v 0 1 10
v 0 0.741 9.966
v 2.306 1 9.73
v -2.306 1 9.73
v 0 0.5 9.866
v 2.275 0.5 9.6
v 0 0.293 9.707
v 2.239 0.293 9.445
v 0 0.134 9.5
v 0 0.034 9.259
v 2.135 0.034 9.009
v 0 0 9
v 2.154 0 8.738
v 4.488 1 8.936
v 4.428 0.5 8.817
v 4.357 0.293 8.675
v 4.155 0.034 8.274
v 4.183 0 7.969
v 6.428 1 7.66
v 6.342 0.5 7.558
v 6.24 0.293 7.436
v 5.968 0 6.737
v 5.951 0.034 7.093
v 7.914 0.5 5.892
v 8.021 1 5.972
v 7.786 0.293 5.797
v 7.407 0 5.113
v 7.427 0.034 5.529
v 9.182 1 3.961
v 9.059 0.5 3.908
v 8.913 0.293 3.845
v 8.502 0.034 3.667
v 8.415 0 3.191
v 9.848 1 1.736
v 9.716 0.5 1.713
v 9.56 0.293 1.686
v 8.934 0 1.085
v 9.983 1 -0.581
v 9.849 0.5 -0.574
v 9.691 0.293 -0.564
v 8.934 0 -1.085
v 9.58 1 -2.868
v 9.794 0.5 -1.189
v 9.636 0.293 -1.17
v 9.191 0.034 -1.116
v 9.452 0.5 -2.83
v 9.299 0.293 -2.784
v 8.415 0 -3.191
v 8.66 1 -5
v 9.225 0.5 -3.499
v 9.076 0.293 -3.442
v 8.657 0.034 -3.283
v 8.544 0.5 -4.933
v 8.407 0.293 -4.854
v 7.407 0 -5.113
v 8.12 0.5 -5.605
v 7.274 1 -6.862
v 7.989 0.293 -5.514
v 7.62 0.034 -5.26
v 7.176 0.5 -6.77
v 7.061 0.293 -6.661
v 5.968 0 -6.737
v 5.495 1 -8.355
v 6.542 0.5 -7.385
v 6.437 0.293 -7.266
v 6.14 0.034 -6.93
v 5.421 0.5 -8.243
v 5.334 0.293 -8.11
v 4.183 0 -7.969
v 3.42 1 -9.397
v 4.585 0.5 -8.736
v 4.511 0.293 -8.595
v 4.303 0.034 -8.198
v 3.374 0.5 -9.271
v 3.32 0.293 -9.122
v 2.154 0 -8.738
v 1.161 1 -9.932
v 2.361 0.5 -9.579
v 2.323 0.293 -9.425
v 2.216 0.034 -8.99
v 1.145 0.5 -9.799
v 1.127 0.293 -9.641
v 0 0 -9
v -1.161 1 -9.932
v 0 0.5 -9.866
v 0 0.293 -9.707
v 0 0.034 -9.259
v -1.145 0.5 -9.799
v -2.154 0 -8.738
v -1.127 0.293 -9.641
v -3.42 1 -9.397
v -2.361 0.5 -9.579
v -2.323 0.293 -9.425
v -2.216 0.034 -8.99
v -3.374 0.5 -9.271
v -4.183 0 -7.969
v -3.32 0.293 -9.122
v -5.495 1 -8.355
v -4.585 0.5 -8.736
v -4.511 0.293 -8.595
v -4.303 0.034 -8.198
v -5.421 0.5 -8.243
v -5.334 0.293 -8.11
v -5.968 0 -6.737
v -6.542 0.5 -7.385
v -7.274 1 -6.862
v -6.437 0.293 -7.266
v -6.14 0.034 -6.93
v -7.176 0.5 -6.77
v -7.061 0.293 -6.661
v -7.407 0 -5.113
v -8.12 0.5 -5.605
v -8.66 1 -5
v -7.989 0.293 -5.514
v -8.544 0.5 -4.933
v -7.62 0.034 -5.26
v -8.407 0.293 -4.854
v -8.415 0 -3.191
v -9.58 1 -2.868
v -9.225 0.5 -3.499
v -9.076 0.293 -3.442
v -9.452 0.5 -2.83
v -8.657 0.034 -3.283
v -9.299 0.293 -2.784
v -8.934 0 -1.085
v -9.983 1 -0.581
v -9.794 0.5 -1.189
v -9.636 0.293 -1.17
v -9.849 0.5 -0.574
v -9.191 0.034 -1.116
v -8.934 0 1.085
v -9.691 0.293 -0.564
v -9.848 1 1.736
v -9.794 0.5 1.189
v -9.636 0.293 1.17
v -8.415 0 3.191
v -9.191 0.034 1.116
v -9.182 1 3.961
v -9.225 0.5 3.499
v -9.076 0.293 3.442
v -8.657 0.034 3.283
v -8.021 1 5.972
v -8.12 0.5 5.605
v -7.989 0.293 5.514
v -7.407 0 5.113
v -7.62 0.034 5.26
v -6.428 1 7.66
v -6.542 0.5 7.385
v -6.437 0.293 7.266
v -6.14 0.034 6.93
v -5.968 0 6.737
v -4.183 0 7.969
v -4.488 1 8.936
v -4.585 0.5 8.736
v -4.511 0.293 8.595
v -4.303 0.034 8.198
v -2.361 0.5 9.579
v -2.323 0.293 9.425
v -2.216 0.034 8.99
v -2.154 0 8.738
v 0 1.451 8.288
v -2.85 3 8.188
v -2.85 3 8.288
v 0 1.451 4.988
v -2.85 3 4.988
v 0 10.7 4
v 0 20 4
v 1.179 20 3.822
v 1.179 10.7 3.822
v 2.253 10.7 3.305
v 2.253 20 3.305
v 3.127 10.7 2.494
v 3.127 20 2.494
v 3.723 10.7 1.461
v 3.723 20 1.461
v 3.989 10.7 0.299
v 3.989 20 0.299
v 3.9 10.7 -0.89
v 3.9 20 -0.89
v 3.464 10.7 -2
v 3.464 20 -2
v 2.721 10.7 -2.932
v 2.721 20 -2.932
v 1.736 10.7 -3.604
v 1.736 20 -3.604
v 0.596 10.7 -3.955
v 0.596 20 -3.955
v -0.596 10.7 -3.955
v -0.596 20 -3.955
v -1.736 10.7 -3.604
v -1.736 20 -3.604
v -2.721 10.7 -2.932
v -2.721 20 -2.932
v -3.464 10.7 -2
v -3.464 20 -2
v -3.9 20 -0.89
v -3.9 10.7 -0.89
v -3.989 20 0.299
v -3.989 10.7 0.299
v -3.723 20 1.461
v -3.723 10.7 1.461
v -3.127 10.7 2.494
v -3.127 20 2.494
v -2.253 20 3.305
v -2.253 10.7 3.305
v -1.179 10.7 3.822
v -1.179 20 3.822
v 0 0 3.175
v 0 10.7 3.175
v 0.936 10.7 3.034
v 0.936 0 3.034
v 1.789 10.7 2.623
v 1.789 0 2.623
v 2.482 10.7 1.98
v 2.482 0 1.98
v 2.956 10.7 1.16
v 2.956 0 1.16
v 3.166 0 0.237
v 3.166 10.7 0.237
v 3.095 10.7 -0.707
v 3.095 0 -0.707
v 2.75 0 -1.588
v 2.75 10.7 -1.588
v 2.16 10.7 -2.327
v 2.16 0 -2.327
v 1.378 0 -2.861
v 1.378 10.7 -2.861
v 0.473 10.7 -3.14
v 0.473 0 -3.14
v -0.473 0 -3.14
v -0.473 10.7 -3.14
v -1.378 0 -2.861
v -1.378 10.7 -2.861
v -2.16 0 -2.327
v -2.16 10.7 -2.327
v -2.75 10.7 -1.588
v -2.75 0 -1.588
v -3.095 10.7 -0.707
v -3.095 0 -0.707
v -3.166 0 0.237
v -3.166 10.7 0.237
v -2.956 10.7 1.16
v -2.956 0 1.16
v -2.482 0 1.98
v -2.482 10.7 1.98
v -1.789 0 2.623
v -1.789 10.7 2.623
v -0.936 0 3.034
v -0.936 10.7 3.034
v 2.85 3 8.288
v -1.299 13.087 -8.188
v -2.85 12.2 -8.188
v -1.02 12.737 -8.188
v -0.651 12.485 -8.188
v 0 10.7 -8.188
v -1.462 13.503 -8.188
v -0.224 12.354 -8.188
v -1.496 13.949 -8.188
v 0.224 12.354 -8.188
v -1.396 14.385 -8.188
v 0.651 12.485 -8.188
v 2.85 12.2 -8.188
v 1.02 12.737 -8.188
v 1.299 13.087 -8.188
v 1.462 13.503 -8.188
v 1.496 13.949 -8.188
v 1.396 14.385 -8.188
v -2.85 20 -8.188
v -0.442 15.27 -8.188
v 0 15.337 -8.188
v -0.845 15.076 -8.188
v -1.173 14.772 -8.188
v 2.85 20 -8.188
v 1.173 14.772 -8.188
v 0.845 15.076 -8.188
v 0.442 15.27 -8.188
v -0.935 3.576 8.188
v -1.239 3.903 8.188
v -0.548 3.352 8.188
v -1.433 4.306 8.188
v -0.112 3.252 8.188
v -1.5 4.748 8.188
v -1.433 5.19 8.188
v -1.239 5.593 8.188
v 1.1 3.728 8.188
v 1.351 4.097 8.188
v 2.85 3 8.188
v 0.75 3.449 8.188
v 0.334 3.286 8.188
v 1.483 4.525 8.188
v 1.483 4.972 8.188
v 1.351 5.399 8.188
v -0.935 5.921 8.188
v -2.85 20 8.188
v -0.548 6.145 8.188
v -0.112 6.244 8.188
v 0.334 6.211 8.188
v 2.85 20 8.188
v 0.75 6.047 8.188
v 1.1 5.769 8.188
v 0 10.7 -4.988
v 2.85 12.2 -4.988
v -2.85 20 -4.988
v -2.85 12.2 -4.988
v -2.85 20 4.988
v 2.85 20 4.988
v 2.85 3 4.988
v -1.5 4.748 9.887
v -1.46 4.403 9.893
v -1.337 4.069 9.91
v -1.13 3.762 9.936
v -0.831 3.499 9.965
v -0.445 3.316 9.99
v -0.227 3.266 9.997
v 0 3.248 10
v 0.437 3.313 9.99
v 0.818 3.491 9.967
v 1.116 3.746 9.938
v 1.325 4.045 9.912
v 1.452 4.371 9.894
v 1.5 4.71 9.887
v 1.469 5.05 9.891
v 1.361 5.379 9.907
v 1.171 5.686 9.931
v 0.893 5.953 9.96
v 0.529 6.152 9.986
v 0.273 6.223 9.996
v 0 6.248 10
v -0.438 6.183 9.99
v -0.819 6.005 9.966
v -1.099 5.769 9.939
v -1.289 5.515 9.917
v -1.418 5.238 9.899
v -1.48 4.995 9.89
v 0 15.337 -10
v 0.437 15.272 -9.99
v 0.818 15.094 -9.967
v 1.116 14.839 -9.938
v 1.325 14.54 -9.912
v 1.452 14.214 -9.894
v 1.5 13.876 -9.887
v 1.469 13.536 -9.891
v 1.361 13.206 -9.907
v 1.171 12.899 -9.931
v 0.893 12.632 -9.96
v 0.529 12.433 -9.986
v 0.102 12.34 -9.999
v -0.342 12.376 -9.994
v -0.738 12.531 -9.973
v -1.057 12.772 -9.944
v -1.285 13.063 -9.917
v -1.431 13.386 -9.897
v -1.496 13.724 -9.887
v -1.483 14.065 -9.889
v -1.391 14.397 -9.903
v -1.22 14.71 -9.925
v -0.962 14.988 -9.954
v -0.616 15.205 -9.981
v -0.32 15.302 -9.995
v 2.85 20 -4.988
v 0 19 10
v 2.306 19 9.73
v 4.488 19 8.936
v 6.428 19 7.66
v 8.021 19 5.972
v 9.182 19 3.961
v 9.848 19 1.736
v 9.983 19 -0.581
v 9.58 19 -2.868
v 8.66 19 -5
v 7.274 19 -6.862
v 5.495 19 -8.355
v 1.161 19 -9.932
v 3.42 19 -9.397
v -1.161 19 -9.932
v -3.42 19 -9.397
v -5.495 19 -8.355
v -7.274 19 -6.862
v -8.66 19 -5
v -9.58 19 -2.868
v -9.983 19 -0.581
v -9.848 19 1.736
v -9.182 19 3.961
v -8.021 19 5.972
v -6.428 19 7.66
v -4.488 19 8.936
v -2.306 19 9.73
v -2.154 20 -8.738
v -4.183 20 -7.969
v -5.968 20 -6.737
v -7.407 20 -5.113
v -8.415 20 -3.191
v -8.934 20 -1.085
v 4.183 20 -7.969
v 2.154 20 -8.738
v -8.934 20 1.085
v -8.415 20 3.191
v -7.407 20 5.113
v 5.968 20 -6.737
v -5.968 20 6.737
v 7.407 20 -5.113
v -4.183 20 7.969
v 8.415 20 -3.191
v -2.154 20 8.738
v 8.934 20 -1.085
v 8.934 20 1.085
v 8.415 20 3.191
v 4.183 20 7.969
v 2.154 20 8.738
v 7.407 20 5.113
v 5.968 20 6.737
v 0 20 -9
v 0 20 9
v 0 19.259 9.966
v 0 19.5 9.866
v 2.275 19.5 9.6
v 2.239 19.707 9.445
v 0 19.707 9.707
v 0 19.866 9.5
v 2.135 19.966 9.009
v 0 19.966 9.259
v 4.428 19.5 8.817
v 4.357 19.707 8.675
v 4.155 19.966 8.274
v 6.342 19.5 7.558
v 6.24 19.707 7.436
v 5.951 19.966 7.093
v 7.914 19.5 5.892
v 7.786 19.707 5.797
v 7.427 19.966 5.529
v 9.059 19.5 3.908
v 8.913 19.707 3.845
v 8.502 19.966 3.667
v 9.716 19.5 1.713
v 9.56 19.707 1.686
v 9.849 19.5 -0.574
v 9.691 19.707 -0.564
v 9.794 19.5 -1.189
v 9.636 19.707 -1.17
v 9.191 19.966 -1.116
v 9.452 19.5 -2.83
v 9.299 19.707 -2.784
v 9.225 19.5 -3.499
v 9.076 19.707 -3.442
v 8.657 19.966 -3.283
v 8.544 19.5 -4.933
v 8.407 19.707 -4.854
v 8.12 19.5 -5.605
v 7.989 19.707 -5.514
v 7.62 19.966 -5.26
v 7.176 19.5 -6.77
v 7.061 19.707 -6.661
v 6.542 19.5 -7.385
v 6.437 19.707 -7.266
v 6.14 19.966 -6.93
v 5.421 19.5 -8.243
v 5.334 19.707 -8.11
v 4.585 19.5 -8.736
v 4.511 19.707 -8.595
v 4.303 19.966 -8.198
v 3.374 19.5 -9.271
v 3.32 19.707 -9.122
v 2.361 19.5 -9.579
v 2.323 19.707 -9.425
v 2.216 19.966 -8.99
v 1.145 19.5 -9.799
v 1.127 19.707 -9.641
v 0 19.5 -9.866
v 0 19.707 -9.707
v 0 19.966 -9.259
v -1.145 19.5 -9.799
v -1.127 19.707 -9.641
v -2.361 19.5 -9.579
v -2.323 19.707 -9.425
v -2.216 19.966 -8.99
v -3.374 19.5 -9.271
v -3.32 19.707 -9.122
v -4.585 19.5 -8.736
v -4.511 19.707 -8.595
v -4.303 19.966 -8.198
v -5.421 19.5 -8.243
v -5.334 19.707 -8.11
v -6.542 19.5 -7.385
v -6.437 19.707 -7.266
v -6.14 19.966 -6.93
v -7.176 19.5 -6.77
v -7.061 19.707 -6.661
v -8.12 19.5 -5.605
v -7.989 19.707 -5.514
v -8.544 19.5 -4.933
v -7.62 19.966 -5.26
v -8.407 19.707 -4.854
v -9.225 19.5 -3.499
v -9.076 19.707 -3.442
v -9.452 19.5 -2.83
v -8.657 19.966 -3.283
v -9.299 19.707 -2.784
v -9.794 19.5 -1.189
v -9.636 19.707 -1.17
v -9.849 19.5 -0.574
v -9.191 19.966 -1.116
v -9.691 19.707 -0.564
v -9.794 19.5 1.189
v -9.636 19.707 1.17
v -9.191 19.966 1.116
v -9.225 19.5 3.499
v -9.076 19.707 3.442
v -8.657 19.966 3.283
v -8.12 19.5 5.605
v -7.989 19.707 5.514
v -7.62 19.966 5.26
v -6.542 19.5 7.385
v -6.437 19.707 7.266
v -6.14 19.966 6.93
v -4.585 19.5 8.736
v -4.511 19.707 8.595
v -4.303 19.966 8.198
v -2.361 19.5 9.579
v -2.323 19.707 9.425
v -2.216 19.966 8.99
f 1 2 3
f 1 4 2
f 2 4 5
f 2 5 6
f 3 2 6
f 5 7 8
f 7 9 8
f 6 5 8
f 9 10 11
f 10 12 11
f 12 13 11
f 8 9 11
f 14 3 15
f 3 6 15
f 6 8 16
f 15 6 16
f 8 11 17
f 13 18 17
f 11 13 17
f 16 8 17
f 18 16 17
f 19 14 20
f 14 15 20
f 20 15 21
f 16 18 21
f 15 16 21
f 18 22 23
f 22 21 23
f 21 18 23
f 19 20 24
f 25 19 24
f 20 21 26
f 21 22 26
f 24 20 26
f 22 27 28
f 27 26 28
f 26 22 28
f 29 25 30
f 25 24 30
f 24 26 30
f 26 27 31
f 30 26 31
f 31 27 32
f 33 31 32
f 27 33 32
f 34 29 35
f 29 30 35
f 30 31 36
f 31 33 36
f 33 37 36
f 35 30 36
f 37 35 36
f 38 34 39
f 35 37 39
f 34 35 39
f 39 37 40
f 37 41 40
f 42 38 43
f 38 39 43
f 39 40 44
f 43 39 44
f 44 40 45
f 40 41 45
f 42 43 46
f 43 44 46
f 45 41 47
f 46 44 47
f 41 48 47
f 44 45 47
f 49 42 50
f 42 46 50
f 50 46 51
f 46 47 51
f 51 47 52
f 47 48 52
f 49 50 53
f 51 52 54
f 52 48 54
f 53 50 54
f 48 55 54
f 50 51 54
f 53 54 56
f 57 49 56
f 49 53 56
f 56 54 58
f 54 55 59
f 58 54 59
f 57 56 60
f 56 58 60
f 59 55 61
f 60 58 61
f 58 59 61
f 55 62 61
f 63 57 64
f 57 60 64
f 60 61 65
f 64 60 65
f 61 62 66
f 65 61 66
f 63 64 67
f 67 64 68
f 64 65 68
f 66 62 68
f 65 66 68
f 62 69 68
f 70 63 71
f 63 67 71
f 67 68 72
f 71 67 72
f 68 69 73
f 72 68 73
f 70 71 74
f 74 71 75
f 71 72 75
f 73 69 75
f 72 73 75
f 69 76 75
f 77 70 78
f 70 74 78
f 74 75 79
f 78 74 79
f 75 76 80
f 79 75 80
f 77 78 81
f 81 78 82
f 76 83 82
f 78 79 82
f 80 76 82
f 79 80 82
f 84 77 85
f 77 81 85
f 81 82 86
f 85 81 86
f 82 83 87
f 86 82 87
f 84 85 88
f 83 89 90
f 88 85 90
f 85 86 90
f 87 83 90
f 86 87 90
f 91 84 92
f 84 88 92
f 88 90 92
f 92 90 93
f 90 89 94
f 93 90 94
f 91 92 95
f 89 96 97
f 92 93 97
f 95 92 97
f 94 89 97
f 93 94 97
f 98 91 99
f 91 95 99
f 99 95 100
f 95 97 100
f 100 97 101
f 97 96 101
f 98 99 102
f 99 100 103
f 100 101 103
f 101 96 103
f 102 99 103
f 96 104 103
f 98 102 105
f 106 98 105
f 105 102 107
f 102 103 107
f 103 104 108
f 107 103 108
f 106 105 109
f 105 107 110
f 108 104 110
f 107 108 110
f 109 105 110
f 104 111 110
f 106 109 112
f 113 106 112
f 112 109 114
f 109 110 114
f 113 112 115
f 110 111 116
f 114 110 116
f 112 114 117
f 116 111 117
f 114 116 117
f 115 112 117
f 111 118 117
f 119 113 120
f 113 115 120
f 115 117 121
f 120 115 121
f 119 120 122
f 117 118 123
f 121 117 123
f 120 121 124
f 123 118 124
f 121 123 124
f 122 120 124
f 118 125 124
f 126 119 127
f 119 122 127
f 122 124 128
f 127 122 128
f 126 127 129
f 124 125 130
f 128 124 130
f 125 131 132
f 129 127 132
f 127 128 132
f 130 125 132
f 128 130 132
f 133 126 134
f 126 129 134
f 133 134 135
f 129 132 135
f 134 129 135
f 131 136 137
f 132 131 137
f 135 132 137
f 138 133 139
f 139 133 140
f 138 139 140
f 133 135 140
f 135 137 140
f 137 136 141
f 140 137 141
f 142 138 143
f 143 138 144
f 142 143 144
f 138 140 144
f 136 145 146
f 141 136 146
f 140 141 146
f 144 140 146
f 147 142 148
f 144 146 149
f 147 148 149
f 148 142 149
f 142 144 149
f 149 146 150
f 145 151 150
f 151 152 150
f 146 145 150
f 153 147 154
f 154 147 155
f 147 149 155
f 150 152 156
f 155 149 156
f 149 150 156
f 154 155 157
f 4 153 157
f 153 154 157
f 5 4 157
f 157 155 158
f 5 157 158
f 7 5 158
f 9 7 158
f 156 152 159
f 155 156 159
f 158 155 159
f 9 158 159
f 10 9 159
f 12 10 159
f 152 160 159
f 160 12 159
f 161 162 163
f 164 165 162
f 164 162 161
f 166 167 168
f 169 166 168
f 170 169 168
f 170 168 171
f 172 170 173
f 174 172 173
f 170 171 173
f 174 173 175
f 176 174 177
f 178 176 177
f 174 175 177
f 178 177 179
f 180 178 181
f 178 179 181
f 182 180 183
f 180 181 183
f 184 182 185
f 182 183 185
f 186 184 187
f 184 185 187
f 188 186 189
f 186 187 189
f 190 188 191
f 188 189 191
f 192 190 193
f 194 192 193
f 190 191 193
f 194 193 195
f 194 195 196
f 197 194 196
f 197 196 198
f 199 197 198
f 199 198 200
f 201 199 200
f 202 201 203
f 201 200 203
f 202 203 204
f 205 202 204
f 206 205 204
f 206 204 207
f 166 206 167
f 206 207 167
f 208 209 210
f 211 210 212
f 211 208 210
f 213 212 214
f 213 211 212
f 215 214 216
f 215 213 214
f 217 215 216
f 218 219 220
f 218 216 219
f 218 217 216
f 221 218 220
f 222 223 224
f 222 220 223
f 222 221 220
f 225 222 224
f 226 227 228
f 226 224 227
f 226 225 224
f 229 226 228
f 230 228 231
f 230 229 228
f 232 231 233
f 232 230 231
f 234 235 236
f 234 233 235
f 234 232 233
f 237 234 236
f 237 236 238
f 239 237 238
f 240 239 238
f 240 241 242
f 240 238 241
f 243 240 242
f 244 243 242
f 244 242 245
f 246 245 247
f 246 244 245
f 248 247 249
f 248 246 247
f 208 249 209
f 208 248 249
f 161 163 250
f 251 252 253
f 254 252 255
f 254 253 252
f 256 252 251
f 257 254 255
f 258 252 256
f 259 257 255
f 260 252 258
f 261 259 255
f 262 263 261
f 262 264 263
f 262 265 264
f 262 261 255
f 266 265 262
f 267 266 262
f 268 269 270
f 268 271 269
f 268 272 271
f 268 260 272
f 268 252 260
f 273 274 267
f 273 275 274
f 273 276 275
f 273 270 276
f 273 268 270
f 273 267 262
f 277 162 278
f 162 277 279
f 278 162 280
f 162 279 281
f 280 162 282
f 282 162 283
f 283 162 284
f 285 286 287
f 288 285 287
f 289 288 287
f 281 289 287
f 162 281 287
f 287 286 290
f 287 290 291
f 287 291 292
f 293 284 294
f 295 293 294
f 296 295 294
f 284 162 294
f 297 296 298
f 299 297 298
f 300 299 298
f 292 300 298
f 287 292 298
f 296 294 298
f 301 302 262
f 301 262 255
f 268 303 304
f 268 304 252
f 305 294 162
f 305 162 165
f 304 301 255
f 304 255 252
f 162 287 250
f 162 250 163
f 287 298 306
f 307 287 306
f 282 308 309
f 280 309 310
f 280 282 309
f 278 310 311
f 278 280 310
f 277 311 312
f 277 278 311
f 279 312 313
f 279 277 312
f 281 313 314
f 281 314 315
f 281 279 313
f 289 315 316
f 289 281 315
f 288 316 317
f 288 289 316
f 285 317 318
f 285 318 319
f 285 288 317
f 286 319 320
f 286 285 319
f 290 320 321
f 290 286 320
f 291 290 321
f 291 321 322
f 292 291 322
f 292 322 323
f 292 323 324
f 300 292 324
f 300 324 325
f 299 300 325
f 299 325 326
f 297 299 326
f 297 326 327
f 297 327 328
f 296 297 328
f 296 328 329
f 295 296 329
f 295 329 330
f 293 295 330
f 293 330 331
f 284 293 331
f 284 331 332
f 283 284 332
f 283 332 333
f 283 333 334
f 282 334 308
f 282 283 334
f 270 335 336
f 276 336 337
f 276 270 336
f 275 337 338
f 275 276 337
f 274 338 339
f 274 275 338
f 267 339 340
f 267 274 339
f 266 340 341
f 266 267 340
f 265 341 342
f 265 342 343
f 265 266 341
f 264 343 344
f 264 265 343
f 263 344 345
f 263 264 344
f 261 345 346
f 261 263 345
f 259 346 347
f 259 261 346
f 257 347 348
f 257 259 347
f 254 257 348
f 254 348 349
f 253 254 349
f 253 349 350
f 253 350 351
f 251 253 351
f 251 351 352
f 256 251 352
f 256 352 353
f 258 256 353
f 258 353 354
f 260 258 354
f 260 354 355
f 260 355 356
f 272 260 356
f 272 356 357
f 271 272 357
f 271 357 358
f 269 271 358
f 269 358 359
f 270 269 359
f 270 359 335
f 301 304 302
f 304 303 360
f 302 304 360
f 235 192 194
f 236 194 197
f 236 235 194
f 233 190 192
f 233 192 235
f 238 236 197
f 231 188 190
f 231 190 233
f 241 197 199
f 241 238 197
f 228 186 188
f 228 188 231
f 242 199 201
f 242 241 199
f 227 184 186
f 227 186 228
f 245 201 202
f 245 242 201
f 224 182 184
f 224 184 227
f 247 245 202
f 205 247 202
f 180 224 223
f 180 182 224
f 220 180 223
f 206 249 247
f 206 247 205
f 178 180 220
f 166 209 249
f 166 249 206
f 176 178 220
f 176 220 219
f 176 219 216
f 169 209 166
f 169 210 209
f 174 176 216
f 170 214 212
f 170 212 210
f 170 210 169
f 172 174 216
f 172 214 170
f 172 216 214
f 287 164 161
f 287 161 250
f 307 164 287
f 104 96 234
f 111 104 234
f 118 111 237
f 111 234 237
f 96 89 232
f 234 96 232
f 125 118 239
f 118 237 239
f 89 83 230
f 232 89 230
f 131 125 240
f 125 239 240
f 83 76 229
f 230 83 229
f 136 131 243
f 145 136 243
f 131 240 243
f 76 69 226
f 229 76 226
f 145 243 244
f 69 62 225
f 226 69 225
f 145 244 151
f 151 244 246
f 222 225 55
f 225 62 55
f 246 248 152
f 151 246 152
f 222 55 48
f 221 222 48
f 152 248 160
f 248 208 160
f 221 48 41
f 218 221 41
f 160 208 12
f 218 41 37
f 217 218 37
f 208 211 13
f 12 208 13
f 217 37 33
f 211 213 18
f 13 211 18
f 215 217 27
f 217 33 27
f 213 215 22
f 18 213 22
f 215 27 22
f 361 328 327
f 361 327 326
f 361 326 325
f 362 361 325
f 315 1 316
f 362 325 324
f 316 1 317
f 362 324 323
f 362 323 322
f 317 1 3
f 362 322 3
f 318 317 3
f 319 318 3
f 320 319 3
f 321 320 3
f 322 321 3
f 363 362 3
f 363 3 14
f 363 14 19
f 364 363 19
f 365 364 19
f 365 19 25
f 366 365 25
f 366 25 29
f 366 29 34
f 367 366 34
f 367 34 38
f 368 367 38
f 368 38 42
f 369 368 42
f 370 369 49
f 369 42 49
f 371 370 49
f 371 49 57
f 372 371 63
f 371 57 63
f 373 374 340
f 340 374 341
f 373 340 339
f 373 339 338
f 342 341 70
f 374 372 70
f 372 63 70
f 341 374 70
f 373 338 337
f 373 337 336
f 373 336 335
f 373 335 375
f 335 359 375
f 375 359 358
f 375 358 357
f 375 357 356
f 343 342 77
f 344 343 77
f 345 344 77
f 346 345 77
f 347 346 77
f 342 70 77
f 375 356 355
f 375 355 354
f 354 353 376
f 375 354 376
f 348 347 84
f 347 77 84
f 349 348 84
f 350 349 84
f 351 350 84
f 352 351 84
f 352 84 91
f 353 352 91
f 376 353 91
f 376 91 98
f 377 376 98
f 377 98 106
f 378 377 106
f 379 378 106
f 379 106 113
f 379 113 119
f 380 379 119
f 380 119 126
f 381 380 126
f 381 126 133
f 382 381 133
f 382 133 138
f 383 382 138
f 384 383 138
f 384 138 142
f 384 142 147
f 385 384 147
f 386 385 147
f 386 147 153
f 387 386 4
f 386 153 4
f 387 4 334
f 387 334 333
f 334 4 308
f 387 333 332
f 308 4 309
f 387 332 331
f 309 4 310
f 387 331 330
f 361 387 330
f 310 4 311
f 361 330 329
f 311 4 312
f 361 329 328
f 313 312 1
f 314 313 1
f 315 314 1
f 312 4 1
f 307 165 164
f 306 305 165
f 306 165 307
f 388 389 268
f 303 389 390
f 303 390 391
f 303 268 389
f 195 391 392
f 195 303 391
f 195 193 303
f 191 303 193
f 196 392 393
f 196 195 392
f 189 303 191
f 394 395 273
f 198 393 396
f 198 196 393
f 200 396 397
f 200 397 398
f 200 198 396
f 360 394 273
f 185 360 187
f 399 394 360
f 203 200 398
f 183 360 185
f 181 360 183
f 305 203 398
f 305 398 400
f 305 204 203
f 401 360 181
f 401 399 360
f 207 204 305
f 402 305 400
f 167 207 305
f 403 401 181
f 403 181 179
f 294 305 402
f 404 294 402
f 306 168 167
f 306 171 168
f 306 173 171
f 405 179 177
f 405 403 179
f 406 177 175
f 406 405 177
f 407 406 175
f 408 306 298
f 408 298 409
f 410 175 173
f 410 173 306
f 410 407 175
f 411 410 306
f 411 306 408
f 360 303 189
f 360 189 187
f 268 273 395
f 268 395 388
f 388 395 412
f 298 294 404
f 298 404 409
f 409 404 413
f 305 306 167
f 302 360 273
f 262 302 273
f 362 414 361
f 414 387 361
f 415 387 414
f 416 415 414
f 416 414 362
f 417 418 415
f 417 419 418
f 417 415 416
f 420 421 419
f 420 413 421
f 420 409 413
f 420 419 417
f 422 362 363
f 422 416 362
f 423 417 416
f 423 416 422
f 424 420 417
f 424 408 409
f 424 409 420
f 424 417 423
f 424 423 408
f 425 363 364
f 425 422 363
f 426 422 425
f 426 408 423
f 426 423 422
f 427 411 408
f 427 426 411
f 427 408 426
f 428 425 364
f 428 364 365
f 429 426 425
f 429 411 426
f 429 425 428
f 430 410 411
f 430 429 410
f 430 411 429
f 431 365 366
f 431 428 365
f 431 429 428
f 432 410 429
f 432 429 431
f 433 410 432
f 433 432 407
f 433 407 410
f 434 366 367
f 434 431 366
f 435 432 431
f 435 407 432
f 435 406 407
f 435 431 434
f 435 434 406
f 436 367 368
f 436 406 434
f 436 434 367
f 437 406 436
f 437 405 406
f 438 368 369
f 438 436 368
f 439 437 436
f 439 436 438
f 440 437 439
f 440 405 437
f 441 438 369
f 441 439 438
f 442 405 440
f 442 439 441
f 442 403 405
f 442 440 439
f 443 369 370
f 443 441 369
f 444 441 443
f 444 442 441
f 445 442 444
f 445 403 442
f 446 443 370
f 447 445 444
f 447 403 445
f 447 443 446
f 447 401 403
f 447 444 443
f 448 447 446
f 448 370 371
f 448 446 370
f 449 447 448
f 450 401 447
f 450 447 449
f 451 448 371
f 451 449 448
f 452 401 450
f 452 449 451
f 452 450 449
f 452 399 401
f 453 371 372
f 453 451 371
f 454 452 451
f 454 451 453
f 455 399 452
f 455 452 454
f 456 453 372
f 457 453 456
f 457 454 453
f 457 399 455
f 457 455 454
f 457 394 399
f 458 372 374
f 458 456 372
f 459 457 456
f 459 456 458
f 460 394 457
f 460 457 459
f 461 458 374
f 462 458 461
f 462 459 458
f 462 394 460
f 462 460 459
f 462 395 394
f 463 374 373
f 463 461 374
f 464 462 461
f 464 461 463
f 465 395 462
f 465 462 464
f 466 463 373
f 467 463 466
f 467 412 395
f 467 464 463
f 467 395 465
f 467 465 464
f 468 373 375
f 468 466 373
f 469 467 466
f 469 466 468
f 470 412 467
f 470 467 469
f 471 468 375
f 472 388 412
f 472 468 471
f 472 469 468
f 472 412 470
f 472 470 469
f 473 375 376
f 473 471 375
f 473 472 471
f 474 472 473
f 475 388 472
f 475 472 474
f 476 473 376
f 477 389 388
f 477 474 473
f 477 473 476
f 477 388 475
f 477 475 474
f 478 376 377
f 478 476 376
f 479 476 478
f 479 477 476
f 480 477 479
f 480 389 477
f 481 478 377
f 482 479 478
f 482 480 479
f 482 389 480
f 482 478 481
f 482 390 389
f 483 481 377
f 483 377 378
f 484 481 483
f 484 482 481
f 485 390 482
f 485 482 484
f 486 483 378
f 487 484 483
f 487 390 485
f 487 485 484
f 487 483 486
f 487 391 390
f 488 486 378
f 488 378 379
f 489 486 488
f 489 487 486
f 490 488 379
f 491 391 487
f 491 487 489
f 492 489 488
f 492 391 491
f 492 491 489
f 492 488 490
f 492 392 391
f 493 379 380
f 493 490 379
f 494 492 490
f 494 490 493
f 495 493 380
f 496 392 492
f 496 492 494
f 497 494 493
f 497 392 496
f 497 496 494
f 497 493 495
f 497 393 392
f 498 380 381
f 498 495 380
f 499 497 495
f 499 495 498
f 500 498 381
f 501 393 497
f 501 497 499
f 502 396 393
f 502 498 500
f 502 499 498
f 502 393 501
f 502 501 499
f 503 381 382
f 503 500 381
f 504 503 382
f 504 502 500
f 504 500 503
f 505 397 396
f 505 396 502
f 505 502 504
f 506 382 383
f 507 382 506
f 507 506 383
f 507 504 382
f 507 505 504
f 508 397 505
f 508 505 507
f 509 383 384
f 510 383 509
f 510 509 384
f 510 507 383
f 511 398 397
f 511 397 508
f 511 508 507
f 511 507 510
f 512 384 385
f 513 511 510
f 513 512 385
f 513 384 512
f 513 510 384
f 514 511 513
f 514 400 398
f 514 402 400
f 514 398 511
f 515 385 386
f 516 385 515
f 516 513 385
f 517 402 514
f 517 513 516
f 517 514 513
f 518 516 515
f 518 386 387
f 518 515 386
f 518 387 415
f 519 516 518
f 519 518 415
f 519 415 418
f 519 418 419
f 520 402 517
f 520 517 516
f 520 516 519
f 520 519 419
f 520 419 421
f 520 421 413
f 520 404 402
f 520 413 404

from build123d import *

# Parameters (mm, degrees)
SKETCH1_R           = 10
SKETCH1_R_2         = 3.175
BOSS_EXTRUDE1_DEPTH = 20
SKETCH2_W           = 5.7
SKETCH2_H           = 3.2
CUT_EXTRUDE1_DEPTH  = 17
CUT_EXTRUDE2_DEPTH  = 3.3
SKETCH4_R           = 4
CUT_EXTRUDE3_DEPTH  = 9.3
SKETCH5_W           = 5.7
SKETCH5_H           = 3.2
CUT_EXTRUDE5_DEPTH  = 7.8
CUT_EXTRUDE6_DEPTH  = 3.2
FILLET1_R           = 1
SKETCH7_R           = 1.5
CUT_EXTRUDE7_DEPTH  = 10.2
SKETCH8_R           = 1.5
CUT_EXTRUDE8_DEPTH  = 7.2


with BuildPart() as part:
    # Sketch1 → Boss-Extrude1 (new body)
    with BuildSketch(Plane(origin=(0, 0, 0), x_dir=(1, 0, 0), z_dir=(0, 1, 0))):
        with Locations(Location((0, 0, 0), (0, 0, 270))):
            Circle(SKETCH1_R)
        with Locations(Location((0, 0, 0), (0, 0, 270))):
            Circle(SKETCH1_R_2, mode=Mode.SUBTRACT)
    extrude(amount=BOSS_EXTRUDE1_DEPTH)

    # Sketch2 → Cut-Extrude1 (cut)
    with BuildSketch(Plane(origin=(0, 20, 0), x_dir=(1, 0, 0), z_dir=(0, 1, 0))):
        with Locations((0, -6.5875)):
            Rectangle(SKETCH2_W, SKETCH2_H)
    extrude(amount=-CUT_EXTRUDE1_DEPTH, mode=Mode.SUBTRACT)

    # Sketch3 → Cut-Extrude2 (cut)
    with BuildSketch(Plane.XY.offset(4.9875)):
        Polygon((-2.85, 3), (0, 1.451324557), (2.85, 3), align=None)
    extrude(amount=CUT_EXTRUDE2_DEPTH, mode=Mode.SUBTRACT)

    # Sketch4 → Cut-Extrude3 (cut)
    with BuildSketch(Plane(origin=(0, 20, 0), x_dir=(1, 0, 0), z_dir=(0, 1, 0))):
        with Locations(Location((0, 0, 0), (0, 0, 270))):
            Circle(SKETCH4_R)
    extrude(amount=-CUT_EXTRUDE3_DEPTH, mode=Mode.SUBTRACT)

    # Sketch5 → Cut-Extrude5 (cut)
    with BuildSketch(Plane(origin=(0, 20, 0), x_dir=(1, 0, 0), z_dir=(0, 1, 0))):
        with Locations((0, 6.5875)):
            Rectangle(SKETCH5_W, SKETCH5_H)
    extrude(amount=-CUT_EXTRUDE5_DEPTH, mode=Mode.SUBTRACT)

    # Sketch6 → Cut-Extrude6 (cut)
    with BuildSketch(Plane(origin=(0, 0, -4.9875), x_dir=(-1, 0, 0), z_dir=(0, 0, -1))):
        Polygon((-2.85, 12.2), (0, 10.7), (2.85, 12.2), align=None)
    extrude(amount=CUT_EXTRUDE6_DEPTH, mode=Mode.SUBTRACT)

    # Fillet1
    fillet1_edges = [part.edges().sort_by_distance(p)[0] for p in [
        (0, 0, -10),
        (0, 20, -10),
    ]]
    fillet(fillet1_edges, radius=FILLET1_R)

    # Sketch7 → Cut-Extrude7 (cut)
    with BuildSketch(Plane(origin=(0, 0, -4.9875), x_dir=(-1, 0, 0), z_dir=(0, 0, -1))):
        with Locations(Location((0, 13.836807089, 0), (0, 0, 90))):
            Circle(SKETCH7_R)
    extrude(amount=CUT_EXTRUDE7_DEPTH, mode=Mode.SUBTRACT)

    # Sketch8 → Cut-Extrude8 (cut)
    with BuildSketch(Plane.XY.offset(4.9875)):
        with Locations(Location((0, 4.748303772, 0), (0, 0, 180))):
            Circle(SKETCH8_R)
    extrude(amount=CUT_EXTRUDE8_DEPTH, mode=Mode.SUBTRACT)


solid = part.part
